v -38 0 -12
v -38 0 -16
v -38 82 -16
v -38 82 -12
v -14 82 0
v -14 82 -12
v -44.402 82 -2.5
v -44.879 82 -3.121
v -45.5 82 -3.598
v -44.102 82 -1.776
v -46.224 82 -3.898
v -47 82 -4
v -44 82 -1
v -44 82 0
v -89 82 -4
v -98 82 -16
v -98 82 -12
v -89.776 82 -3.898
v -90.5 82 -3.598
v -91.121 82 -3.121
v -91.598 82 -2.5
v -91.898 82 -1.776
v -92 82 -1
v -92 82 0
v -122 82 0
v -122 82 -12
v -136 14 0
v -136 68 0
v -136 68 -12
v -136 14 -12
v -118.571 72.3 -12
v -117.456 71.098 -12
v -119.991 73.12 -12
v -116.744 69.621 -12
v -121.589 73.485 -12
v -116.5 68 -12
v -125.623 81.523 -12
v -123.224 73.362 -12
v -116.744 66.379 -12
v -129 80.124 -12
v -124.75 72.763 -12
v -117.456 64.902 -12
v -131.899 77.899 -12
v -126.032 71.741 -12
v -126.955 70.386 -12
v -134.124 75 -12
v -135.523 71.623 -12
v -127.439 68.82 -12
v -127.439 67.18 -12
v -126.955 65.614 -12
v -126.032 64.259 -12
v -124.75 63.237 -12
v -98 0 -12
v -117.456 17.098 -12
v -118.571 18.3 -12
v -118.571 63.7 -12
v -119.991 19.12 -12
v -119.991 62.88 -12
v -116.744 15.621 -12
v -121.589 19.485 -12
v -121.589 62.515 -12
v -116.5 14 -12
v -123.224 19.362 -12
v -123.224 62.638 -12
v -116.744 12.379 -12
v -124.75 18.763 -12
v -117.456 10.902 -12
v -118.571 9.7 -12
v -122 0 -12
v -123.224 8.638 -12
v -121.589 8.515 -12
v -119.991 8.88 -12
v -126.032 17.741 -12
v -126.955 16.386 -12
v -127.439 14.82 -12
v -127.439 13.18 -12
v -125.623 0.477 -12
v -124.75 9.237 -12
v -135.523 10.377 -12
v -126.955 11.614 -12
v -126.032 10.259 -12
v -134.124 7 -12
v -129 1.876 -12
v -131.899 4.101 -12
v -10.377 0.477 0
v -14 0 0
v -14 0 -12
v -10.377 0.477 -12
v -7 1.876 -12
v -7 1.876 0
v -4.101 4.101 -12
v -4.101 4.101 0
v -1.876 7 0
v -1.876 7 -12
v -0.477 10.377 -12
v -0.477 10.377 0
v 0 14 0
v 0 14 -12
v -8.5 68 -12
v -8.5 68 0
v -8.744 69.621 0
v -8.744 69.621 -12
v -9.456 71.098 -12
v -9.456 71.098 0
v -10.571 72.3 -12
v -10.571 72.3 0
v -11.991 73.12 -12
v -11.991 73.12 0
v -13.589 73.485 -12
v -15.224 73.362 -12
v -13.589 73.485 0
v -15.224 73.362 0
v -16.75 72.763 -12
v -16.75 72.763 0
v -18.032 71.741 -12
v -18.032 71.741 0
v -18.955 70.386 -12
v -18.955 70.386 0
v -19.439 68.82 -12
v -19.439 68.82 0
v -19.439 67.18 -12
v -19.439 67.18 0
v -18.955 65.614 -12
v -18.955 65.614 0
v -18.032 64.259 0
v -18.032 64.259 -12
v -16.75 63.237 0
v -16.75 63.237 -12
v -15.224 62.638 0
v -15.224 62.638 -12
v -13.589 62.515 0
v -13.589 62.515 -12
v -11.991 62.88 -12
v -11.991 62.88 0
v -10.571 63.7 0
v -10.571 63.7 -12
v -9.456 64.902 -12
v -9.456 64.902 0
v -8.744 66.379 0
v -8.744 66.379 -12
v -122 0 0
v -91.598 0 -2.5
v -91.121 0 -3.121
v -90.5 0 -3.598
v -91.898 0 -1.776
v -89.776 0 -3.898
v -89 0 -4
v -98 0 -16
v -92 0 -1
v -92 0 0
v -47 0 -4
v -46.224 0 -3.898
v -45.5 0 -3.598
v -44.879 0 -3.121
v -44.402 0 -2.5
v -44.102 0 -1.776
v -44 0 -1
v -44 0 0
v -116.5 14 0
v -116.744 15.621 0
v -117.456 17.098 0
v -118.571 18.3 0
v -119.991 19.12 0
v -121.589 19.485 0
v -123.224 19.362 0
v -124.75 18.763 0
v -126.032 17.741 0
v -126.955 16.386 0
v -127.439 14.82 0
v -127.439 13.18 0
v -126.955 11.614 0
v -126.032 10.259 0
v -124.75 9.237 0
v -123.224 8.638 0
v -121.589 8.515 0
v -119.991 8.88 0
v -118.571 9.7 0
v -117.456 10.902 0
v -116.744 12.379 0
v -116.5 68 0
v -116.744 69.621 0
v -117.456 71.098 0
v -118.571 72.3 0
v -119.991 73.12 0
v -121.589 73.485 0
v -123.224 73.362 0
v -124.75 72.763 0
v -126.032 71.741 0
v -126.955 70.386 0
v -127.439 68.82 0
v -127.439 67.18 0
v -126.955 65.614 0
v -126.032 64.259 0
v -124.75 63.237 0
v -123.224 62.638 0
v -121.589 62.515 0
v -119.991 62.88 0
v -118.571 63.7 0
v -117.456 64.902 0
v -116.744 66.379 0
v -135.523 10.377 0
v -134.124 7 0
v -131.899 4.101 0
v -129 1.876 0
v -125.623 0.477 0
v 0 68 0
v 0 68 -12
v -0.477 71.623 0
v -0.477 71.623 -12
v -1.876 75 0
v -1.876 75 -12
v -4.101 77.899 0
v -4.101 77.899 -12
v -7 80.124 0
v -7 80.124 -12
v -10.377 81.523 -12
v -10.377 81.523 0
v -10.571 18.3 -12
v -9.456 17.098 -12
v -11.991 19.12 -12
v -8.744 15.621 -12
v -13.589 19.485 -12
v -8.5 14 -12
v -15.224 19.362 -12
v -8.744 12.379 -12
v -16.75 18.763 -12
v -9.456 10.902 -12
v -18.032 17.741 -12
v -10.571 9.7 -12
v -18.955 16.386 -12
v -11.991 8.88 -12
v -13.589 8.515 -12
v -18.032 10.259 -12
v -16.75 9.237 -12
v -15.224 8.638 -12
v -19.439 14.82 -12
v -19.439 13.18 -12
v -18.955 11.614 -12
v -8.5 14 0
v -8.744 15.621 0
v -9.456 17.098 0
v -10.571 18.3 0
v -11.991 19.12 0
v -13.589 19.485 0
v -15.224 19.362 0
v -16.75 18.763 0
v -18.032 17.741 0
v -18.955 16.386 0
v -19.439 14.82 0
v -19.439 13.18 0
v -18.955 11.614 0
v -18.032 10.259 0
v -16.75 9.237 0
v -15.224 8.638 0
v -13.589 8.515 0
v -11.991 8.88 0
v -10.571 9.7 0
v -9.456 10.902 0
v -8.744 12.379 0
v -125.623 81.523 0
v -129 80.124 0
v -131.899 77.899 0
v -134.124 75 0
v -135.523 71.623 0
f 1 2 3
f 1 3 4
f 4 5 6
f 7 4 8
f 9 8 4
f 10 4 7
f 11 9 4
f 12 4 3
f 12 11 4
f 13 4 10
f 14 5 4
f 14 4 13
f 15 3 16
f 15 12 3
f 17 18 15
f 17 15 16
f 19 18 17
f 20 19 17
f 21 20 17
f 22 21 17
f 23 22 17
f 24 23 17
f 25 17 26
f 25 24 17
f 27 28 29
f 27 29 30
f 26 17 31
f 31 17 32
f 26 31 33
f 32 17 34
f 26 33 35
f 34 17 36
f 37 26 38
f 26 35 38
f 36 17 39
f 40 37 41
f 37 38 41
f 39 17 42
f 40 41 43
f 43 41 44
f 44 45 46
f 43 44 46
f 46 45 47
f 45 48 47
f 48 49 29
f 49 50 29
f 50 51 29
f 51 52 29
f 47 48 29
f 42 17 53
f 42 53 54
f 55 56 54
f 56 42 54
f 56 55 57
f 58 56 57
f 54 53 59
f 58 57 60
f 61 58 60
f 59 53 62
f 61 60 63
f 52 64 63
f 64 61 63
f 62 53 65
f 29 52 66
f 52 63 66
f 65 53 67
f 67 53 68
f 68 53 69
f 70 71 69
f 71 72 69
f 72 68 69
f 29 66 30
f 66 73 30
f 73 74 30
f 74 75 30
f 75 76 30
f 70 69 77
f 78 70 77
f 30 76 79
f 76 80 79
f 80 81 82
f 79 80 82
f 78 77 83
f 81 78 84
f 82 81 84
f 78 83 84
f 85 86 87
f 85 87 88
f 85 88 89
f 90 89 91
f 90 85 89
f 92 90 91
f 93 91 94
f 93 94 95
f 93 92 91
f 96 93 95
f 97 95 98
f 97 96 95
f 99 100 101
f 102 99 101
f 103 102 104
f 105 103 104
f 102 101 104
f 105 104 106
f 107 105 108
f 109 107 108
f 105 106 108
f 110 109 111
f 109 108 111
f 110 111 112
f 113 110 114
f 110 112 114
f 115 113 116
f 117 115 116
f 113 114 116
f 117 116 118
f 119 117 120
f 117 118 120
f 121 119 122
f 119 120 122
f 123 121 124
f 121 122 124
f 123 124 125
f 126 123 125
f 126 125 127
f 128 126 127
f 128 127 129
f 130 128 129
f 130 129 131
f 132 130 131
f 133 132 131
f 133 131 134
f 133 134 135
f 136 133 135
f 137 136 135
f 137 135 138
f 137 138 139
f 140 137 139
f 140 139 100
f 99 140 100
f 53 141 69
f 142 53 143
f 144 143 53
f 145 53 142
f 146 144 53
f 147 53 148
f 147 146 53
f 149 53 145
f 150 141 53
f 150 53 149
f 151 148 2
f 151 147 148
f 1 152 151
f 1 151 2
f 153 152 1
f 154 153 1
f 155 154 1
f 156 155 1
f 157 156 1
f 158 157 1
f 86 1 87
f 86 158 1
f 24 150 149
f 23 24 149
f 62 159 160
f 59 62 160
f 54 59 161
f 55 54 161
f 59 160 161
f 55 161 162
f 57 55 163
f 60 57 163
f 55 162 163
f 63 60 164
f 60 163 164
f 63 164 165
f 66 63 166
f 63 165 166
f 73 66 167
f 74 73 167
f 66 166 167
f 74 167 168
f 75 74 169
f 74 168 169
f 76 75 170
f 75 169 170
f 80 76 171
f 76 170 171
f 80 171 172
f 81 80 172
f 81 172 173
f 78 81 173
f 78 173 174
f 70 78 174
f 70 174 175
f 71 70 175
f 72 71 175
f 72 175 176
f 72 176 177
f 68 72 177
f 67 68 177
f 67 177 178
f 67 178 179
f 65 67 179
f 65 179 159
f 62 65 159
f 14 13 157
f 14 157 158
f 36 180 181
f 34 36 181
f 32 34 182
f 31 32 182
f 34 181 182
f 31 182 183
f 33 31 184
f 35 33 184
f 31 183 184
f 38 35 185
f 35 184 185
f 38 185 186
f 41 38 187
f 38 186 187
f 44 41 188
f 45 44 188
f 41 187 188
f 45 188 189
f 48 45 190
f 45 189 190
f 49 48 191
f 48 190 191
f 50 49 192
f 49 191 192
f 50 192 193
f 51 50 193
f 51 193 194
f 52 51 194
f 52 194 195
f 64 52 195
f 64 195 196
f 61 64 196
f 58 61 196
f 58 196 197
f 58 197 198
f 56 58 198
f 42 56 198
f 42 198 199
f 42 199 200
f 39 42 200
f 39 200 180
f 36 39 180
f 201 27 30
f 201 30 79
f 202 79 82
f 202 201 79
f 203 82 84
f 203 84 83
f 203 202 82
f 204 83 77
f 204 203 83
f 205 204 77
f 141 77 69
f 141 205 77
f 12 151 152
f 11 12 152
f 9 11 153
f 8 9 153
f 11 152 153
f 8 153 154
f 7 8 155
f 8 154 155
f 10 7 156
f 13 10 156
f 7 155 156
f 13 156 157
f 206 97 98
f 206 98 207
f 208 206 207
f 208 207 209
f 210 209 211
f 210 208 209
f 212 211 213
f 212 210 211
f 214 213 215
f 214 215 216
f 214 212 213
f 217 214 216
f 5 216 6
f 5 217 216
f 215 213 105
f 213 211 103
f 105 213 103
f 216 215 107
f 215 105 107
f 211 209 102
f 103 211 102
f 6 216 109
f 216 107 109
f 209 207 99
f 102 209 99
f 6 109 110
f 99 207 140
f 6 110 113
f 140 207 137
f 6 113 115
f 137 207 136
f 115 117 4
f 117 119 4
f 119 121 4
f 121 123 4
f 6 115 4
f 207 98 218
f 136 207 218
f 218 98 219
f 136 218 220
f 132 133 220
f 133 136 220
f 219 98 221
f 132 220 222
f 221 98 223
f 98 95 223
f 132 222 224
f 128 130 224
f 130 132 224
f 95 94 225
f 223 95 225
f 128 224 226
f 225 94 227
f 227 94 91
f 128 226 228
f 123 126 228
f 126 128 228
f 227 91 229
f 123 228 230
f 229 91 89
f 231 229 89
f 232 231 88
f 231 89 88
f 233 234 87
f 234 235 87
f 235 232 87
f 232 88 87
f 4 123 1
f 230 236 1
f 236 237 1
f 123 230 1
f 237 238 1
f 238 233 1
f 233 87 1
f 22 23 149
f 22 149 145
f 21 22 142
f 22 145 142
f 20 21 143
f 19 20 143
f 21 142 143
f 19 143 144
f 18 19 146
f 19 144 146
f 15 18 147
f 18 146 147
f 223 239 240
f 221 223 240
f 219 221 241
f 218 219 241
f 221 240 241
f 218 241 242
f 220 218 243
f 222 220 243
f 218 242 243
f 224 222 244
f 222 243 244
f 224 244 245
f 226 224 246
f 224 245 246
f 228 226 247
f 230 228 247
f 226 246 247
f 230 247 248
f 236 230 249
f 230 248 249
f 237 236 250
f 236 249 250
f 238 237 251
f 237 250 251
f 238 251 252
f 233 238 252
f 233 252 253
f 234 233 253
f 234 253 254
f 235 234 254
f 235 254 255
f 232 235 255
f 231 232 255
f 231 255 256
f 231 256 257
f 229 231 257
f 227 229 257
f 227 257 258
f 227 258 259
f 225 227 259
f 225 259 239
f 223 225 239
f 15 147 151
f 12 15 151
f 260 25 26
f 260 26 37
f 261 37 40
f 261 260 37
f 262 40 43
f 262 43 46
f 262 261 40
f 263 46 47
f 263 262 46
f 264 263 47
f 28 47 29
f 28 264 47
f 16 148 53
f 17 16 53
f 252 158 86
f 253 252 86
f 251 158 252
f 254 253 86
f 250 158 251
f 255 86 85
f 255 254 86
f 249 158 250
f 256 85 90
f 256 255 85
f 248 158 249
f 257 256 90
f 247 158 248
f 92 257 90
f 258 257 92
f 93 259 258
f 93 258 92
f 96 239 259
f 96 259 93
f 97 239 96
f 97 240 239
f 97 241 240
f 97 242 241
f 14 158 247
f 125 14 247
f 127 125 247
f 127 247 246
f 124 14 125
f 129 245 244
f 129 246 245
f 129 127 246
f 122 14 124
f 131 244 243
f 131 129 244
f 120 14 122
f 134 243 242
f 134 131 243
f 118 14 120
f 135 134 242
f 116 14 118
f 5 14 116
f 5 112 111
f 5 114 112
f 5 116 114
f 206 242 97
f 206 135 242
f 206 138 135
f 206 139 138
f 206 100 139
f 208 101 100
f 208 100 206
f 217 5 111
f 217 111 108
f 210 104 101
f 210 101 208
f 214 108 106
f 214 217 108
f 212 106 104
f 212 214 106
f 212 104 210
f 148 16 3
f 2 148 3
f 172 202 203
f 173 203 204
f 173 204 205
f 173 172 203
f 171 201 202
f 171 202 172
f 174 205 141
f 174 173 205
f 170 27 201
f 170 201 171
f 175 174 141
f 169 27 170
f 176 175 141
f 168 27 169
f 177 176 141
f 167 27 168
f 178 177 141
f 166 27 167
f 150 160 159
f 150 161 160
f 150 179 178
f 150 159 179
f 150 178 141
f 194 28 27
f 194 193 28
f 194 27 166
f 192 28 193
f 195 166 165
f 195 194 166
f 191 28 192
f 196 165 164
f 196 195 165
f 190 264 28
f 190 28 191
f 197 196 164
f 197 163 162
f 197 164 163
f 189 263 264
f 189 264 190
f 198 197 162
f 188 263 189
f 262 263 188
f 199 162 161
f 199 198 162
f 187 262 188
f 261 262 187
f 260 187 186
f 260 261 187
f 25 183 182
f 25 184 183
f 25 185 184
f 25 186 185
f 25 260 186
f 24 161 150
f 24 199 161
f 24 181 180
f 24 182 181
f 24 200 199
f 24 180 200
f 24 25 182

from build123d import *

# Parameters (mm, degrees)
F0_R     = 5.5
F1_DEPTH = 16
F2_W     = 24
F2_H     = 4
F2_W_2   = 14
F3_DEPTH = 82.001


with BuildPart() as f1:
    # F0 (on Top) → F1 (new body)
    with BuildSketch(Plane.XY):
        with BuildLine():
            Line((-122, 0), (-14, 0))
            ThreePointArc((-14, 0), (-4.100505, 4.100505), (0, 14))
            Line((0, 14), (0, 68))
            ThreePointArc((0, 68), (-4.100505, 77.899495), (-14, 82))
            Line((-14, 82), (-122, 82))
            ThreePointArc((-122, 82), (-131.899495, 77.899495), (-136, 68))
            Line((-136, 68), (-136, 14))
            ThreePointArc((-136, 14), (-131.899495, 4.100505), (-122, 0))
        make_face()
        with Locations((-122, 14)):
            Circle(F0_R, mode=Mode.SUBTRACT)
        with Locations((-14, 14)):
            Circle(F0_R, mode=Mode.SUBTRACT)
        with Locations((-122, 68)):
            Circle(F0_R, mode=Mode.SUBTRACT)
        with Locations((-14, 68)):
            Circle(F0_R, mode=Mode.SUBTRACT)
    extrude(amount=-F1_DEPTH)

    # F2 (on face) → F3 (cut, through all)
    with BuildSketch(Plane.XZ):
        with Locations((-110, -14)):
            Rectangle(F2_W, F2_H)
        with Locations((-129, -14)):
            Rectangle(F2_W_2, F2_H)
        with Locations((-26, -14)):
            Rectangle(F2_W, F2_H)
        with Locations((-7, -14)):
            Rectangle(F2_W_2, F2_H)
        with BuildLine():
            Line((-44, -1), (-44, 0))
            Line((-44, 0), (-92, 0))
            Line((-92, 0), (-92, -1))
            ThreePointArc((-92, -1), (-91.12132, -3.12132), (-89, -4))
            Line((-89, -4), (-47, -4))
            ThreePointArc((-47, -4), (-44.87868, -3.12132), (-44, -1))
        make_face()
    extrude(amount=-F3_DEPTH, mode=Mode.SUBTRACT)


solid = f1.part
